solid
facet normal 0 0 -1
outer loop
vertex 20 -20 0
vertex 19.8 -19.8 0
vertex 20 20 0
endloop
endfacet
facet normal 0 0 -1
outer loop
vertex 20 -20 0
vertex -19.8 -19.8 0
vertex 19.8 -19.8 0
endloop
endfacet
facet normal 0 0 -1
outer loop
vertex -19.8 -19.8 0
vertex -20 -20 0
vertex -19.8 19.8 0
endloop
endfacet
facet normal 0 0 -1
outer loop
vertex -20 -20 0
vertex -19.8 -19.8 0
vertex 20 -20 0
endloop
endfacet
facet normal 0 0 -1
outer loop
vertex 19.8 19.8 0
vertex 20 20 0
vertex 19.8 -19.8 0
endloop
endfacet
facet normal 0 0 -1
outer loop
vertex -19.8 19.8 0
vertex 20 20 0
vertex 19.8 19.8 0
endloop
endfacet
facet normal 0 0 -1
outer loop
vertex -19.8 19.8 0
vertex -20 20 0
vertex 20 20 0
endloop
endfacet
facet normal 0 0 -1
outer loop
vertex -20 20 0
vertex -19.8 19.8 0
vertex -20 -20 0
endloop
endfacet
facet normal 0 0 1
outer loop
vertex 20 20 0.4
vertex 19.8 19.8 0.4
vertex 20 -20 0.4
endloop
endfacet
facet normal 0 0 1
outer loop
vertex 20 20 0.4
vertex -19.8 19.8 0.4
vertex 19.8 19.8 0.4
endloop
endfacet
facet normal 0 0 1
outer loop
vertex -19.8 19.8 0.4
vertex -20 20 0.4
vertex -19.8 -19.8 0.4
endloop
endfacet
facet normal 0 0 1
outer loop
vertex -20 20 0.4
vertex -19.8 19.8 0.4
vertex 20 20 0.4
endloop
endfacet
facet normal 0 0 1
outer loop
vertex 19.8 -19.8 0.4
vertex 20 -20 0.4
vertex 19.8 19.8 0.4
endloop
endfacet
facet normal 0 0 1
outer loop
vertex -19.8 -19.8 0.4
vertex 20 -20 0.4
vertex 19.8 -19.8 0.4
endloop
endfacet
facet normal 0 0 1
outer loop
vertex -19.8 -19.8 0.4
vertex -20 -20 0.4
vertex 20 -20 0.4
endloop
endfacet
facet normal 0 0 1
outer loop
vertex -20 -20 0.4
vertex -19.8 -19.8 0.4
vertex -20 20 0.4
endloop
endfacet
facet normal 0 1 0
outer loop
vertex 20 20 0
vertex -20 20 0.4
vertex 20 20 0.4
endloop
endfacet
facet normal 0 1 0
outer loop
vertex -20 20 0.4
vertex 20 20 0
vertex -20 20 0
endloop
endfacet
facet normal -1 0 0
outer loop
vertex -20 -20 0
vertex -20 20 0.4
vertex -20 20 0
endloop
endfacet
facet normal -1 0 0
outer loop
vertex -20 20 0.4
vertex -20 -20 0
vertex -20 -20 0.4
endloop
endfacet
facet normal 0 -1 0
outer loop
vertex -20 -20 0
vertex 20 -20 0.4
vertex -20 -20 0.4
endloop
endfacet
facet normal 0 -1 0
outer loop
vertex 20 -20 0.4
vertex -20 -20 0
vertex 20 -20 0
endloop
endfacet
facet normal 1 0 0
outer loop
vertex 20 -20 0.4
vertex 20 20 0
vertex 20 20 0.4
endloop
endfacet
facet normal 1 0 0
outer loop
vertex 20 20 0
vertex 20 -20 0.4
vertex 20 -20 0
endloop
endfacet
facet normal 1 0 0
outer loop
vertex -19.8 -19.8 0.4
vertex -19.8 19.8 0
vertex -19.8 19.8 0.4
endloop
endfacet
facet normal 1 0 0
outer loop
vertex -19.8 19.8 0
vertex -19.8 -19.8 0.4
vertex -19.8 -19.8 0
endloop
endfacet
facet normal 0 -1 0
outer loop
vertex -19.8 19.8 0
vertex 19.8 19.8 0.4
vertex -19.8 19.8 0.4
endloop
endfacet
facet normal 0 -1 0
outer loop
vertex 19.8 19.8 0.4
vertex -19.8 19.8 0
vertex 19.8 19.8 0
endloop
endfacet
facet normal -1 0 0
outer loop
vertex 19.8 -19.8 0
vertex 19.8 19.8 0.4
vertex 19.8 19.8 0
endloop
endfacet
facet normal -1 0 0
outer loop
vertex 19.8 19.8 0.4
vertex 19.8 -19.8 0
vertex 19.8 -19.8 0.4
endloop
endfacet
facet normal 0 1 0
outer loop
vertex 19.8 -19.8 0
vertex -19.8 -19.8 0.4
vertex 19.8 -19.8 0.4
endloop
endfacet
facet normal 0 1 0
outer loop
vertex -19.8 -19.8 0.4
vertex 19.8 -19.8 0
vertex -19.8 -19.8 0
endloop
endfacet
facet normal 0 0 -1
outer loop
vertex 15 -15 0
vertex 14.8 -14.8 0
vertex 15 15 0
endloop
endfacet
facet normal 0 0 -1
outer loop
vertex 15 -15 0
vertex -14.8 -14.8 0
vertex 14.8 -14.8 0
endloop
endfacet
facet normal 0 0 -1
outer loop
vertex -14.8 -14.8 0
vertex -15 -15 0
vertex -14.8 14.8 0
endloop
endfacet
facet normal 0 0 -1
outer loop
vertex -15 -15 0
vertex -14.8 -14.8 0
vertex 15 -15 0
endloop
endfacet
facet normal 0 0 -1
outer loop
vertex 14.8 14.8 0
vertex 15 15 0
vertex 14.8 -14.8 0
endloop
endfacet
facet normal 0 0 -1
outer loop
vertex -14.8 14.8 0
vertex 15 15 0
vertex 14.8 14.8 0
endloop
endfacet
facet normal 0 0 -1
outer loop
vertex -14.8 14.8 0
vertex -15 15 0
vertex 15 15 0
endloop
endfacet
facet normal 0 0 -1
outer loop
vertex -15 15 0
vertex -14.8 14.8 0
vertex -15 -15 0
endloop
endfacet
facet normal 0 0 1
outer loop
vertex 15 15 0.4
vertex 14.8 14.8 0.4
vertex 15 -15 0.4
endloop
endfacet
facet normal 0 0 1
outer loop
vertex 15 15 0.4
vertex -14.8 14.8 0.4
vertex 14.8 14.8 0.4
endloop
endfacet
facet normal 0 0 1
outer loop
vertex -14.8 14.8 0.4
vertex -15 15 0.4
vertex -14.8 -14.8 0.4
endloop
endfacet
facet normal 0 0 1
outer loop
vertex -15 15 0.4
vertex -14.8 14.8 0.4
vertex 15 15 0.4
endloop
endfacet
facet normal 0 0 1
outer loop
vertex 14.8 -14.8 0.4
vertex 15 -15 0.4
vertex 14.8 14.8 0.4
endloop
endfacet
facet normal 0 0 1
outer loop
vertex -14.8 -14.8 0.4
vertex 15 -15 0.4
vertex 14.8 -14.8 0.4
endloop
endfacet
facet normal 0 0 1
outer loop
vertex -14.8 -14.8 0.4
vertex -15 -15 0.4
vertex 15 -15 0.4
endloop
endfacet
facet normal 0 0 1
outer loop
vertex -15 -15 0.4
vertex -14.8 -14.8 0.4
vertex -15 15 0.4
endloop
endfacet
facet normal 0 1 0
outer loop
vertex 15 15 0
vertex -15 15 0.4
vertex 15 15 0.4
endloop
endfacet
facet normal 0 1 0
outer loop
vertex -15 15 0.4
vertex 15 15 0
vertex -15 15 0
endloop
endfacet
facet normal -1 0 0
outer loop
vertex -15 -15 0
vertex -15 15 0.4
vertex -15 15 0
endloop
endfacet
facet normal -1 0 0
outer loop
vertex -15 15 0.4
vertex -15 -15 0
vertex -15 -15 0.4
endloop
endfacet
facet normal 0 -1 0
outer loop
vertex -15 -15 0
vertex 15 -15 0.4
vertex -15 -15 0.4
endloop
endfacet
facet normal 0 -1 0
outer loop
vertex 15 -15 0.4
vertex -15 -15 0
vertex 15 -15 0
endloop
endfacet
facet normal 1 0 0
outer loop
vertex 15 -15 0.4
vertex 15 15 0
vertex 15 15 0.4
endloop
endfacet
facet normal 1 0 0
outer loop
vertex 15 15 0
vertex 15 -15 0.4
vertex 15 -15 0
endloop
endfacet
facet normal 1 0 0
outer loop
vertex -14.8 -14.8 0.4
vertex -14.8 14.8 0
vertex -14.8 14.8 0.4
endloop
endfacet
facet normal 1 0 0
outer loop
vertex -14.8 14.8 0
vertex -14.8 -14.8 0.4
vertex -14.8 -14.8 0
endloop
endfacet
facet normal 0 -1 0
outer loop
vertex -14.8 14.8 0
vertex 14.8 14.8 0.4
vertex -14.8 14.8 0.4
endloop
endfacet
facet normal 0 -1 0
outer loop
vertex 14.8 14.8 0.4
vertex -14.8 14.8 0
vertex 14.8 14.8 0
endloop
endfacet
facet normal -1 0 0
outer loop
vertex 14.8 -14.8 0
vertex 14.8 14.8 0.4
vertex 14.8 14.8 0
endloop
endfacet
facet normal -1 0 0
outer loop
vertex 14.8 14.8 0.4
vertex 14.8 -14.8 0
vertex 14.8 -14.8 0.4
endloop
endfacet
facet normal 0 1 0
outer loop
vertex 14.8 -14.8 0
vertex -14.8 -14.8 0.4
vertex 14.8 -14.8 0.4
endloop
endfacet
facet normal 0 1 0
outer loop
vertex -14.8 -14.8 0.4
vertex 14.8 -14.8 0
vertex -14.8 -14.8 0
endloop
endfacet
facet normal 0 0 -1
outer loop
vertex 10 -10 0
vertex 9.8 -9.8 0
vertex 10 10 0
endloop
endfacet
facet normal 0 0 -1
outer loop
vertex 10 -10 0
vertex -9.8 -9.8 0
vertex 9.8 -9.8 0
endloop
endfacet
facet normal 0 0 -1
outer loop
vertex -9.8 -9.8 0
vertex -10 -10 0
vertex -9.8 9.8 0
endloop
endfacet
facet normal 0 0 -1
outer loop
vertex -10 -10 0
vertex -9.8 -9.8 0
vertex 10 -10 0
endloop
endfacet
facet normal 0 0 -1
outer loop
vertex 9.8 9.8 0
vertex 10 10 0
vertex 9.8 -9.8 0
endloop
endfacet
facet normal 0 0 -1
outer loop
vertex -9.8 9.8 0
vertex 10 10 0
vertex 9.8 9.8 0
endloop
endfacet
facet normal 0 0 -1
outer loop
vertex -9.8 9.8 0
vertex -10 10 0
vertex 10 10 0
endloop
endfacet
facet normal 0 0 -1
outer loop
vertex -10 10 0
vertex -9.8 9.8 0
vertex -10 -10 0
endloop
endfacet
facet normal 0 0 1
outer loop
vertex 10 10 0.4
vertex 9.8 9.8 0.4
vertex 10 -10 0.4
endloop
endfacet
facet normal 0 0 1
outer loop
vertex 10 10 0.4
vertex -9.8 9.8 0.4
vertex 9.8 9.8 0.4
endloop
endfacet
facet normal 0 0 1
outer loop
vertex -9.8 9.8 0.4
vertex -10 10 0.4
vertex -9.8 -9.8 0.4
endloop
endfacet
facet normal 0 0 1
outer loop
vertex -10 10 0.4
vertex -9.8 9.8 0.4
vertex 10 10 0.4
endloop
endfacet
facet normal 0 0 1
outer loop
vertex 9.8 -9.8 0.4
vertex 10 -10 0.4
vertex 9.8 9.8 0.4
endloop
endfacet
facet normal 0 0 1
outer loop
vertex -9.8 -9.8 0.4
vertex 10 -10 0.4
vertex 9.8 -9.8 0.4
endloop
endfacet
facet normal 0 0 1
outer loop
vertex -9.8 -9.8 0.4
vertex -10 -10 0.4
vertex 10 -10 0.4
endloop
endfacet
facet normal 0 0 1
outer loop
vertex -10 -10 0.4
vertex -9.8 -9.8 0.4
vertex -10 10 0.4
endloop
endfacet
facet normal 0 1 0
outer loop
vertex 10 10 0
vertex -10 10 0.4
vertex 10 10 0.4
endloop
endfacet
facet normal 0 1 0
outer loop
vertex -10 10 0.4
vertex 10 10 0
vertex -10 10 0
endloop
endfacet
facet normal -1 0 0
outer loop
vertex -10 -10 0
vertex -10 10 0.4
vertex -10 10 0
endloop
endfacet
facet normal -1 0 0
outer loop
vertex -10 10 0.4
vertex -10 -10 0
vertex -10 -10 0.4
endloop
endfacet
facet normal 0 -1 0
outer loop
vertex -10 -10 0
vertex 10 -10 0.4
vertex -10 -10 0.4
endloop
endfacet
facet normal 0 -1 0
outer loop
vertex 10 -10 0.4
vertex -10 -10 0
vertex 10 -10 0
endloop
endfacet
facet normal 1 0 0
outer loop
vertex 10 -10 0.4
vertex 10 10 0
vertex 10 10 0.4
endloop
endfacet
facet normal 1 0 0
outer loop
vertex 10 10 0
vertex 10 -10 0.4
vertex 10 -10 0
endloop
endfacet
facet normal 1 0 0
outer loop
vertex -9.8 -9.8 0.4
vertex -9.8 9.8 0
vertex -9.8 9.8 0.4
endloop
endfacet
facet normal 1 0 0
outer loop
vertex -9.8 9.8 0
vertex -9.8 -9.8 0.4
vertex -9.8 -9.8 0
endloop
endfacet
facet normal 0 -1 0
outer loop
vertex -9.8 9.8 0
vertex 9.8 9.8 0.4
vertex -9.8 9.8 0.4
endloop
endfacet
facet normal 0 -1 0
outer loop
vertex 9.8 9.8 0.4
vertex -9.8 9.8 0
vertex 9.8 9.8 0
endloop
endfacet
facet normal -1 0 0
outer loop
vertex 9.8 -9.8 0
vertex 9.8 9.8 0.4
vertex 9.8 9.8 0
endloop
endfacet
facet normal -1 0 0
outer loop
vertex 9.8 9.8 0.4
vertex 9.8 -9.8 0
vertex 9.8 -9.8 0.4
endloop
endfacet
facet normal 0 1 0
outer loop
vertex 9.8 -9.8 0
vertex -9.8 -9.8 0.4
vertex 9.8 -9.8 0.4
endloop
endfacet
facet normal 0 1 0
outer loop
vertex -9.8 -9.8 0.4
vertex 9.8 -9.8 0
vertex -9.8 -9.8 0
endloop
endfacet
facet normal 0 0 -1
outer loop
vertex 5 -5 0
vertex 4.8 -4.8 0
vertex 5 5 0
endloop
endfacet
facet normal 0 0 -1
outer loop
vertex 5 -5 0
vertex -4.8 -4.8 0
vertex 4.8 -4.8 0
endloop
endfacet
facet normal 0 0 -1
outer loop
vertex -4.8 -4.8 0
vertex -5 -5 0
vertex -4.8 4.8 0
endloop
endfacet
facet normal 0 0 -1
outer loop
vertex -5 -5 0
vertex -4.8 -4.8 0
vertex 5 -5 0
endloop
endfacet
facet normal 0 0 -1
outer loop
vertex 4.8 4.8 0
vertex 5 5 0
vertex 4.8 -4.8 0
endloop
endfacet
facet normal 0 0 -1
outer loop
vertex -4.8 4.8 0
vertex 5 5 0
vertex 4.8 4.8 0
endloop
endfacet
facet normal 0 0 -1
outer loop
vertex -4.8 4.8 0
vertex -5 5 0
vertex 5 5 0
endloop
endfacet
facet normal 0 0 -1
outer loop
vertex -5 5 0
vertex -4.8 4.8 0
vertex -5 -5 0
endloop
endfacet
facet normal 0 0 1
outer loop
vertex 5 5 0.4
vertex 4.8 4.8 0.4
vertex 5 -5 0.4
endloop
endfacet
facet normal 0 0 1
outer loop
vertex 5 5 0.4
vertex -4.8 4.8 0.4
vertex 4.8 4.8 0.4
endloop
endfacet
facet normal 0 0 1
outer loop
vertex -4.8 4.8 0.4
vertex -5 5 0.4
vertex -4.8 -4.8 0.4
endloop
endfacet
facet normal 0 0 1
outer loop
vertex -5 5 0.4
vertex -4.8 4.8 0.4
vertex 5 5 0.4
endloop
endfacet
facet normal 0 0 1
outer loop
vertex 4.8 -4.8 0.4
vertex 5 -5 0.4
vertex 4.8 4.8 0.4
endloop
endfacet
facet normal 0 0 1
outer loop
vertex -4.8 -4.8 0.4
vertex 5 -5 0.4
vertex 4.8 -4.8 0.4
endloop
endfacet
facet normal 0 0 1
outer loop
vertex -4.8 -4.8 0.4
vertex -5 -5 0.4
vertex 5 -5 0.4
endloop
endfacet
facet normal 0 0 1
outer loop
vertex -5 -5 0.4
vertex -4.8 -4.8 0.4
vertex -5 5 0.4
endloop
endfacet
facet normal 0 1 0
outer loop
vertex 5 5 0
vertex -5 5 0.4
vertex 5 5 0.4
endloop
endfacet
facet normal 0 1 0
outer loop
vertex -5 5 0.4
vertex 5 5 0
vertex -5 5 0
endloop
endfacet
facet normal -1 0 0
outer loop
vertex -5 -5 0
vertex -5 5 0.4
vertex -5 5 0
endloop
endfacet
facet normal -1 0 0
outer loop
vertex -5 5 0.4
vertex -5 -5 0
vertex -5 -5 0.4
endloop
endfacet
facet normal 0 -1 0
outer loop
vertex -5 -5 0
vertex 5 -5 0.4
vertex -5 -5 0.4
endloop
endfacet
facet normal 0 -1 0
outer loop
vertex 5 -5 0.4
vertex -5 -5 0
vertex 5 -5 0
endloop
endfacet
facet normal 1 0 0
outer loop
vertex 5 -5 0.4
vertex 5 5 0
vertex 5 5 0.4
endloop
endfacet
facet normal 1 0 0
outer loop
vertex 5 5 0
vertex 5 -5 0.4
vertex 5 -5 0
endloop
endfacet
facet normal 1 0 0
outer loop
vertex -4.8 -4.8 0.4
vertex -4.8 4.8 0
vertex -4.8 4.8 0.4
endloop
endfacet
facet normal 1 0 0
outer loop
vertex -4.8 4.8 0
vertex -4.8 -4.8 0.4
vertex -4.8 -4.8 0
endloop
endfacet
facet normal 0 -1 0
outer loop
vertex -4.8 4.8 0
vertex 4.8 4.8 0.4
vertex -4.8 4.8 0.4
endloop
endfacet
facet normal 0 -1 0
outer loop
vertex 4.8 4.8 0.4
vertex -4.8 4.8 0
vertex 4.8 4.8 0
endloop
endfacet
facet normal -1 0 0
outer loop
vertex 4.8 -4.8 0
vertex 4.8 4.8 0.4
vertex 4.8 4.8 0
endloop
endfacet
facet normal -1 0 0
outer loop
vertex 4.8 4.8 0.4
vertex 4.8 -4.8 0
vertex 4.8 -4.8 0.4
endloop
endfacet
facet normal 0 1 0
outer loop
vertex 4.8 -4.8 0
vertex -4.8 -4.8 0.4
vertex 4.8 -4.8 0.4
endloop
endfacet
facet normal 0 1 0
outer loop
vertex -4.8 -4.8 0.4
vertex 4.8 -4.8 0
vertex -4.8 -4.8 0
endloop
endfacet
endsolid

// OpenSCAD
line_width = 0.4;
line_height = 0.4;

/*
linear_extrude(line_height) {
    for (y=[-60:15:60]) {
        translate([-60,y]) {
            square([120+line_width,line_width]);
        }
    }
    for (y=[-45:30:60]) {
        translate([60,y]) {
            square([line_width,15]);
        }
    }

    for (y=[-60:30:45]) {
        translate([-60,y]) {
            square([line_width,15]);
        }
    }
}
*/

for(xy = [40:-10:10]) {
    linear_extrude(line_height) {
        difference() {
            square([xy,xy], center=true);
            square([xy-line_width,xy-line_width], center=true);
        }
    }
}
